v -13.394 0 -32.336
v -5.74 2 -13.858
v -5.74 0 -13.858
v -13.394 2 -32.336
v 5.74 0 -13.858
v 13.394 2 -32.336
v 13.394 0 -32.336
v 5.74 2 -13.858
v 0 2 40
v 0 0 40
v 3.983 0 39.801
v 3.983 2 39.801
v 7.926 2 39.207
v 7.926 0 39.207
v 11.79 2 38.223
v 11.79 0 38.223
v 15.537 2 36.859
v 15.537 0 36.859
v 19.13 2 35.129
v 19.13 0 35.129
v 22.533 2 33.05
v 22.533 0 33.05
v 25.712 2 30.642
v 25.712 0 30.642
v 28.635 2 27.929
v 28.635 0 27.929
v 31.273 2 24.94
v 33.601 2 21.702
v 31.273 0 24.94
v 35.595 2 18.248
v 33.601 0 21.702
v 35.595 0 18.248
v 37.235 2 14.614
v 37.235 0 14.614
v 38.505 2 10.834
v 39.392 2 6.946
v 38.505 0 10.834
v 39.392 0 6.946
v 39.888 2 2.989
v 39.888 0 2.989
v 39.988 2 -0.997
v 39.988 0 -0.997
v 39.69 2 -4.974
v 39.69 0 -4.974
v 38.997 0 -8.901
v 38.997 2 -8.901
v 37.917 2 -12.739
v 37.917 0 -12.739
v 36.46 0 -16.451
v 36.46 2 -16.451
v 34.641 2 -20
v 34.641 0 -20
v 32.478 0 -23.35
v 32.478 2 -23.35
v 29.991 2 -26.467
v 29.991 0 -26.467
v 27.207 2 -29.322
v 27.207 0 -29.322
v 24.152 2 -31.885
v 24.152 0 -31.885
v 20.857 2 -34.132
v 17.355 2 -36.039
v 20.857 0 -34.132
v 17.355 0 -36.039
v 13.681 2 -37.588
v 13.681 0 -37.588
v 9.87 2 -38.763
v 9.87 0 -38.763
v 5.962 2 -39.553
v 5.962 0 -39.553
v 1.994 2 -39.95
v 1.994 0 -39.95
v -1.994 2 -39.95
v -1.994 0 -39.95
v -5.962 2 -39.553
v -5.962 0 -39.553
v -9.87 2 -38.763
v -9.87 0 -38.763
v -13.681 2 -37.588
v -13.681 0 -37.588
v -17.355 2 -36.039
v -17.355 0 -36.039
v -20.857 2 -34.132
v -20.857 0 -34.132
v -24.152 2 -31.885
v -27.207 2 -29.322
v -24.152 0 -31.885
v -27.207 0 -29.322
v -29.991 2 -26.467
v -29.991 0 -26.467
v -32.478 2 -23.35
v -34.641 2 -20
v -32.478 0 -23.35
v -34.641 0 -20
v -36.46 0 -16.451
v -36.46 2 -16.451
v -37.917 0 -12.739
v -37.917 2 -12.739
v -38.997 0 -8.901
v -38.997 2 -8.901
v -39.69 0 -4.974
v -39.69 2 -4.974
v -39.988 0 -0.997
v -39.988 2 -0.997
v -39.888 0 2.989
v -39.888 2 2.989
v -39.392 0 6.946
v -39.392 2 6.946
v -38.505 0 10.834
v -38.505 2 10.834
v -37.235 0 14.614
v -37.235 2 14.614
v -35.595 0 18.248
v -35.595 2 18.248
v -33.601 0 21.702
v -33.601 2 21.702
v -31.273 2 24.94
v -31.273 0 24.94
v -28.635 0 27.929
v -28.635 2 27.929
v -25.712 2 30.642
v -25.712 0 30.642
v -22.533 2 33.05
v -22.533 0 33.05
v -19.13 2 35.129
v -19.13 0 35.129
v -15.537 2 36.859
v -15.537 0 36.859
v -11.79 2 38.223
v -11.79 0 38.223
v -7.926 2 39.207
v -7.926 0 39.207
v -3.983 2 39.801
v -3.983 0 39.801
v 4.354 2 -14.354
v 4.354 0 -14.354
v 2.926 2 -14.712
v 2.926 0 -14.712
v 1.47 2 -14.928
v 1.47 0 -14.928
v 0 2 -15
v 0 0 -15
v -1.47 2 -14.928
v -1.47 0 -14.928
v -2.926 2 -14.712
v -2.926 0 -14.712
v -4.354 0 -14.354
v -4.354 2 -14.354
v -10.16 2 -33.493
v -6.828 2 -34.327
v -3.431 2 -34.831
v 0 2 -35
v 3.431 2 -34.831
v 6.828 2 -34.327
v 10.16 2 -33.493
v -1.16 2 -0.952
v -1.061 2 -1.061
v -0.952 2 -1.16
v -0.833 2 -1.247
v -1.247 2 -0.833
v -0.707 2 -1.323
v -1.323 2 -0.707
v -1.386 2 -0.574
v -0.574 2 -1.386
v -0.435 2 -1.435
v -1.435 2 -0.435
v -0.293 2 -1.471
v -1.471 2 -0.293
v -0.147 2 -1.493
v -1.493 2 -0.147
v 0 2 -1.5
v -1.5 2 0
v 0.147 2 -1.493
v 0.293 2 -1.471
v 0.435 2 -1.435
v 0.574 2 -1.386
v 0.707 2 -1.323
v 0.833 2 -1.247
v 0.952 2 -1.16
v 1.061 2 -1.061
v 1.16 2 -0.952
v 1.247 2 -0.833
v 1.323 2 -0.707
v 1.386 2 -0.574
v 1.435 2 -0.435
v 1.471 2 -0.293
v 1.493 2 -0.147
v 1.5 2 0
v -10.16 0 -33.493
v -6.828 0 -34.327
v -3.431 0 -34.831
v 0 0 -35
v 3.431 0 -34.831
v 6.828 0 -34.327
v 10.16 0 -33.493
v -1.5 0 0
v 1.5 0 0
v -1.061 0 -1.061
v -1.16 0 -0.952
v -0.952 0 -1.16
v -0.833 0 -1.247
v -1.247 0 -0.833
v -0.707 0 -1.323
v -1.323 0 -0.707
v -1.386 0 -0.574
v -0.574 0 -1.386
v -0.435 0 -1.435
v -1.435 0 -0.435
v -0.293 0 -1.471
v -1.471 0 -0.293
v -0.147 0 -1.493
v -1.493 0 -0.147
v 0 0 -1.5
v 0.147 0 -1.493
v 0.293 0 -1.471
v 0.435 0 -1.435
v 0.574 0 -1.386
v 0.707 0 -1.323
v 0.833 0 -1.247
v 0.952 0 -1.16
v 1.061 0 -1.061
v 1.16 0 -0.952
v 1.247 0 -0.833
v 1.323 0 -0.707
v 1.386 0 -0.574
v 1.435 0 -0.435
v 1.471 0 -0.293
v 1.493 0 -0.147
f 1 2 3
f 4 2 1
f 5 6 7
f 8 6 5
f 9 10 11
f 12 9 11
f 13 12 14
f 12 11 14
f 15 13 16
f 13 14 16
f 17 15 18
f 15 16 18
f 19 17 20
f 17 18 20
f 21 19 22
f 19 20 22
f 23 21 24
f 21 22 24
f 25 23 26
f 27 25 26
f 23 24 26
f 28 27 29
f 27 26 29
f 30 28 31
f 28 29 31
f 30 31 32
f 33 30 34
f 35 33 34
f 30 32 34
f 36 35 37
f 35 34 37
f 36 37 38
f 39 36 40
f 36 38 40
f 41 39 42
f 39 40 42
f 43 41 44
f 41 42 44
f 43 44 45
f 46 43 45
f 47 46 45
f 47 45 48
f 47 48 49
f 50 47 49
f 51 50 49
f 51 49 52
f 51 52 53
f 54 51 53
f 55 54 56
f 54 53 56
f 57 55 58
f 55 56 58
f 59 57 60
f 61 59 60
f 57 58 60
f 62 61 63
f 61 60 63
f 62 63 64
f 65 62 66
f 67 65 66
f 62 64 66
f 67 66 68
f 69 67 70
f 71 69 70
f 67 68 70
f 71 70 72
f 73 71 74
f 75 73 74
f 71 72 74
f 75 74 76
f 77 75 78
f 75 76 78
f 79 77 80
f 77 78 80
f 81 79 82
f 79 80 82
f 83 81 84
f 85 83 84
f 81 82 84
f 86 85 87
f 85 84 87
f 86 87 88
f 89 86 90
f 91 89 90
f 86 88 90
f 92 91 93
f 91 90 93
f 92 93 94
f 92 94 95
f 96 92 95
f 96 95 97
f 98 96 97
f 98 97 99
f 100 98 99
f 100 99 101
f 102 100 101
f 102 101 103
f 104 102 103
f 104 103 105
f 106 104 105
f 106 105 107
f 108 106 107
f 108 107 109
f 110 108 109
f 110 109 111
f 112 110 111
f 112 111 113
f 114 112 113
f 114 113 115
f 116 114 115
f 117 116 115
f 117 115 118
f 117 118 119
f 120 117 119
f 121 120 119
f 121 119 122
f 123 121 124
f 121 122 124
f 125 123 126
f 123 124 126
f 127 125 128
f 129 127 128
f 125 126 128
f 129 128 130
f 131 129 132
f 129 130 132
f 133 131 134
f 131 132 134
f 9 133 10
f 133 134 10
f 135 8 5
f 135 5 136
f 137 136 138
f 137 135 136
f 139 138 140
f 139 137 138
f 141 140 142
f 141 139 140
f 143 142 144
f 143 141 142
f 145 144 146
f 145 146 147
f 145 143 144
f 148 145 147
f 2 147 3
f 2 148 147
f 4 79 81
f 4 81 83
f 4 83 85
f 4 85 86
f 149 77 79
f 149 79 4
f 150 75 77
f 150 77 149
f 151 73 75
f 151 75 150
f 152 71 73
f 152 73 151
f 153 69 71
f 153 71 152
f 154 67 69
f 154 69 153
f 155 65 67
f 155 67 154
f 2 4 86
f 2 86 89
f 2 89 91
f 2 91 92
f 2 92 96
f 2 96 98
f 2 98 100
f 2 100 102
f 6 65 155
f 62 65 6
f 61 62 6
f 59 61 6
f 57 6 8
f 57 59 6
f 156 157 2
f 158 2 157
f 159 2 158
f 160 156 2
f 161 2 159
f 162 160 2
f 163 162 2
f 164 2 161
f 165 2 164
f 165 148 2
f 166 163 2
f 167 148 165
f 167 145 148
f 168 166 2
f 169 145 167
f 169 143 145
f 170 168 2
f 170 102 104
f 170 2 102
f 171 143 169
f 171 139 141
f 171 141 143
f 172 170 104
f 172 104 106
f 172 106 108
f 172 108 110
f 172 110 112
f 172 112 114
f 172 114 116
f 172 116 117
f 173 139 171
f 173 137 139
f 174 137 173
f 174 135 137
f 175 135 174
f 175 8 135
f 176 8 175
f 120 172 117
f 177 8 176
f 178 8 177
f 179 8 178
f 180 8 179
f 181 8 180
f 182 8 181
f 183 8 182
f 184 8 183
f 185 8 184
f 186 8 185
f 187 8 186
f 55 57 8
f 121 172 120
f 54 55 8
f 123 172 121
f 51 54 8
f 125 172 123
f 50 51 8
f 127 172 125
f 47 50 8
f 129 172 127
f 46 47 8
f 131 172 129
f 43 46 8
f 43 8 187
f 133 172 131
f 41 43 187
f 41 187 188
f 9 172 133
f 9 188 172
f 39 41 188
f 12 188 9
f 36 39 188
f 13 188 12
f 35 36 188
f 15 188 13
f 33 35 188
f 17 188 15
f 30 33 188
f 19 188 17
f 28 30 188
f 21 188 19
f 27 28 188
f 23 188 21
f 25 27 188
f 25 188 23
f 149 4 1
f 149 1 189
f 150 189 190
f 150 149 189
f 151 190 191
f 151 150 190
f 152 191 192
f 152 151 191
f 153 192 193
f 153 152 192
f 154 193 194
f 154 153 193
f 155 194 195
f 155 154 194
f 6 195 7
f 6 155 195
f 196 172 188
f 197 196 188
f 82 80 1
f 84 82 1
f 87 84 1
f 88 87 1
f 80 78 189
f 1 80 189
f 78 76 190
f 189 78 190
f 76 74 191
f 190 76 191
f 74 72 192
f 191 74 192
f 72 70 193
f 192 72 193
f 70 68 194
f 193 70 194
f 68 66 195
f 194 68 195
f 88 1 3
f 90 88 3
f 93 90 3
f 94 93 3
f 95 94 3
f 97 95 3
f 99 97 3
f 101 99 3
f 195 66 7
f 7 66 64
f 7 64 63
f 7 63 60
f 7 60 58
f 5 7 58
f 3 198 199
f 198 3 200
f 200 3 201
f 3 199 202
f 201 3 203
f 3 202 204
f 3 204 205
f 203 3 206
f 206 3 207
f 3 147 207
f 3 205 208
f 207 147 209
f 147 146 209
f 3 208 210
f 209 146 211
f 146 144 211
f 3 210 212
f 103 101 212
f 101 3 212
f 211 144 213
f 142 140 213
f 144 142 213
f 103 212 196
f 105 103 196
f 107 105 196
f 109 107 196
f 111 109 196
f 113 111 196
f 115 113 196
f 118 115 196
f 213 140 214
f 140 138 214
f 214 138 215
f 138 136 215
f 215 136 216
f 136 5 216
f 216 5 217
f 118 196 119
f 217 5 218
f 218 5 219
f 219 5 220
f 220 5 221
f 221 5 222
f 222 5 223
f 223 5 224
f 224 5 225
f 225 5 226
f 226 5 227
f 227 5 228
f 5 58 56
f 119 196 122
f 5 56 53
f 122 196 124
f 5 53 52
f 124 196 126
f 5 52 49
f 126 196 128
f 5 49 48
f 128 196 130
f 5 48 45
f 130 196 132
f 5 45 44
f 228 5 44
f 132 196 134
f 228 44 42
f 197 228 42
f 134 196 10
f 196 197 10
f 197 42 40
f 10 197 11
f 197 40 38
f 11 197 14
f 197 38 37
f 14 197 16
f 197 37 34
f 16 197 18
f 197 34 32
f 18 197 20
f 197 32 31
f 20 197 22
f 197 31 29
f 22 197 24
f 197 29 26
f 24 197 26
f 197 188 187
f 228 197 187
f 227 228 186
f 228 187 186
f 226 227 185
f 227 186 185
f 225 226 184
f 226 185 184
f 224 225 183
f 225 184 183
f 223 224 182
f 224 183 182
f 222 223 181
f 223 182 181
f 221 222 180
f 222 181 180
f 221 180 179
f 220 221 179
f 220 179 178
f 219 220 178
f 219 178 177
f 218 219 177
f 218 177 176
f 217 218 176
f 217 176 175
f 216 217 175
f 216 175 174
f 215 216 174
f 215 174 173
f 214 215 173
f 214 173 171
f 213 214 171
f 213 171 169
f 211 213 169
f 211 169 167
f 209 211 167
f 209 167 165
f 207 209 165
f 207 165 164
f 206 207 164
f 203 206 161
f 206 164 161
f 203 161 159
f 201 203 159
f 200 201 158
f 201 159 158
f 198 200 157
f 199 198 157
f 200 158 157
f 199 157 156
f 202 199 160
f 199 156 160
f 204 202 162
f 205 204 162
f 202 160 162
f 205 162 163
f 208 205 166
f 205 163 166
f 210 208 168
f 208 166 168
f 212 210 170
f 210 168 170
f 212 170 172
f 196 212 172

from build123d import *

# Parameters (mm, degrees)
SKETCH2_R           = 40
BOSS_EXTRUDE1_DEPTH = 2
CUT_EXTRUDE1_REACH  = 58.604
CUT_EXTRUDE2_DEPTH  = 57.603886792


with BuildPart() as part:
    # Sketch2 → Boss-Extrude1 (new body)
    with BuildSketch(Plane(origin=(0, 0, 0), x_dir=(1, 0, 0), z_dir=(0, 1, 0))):
        with Locations(Location((0, 0, 0), (0, 0, 270))):
            Circle(SKETCH2_R)
    extrude(amount=BOSS_EXTRUDE1_DEPTH)

    # Sketch3 → Cut-Extrude1 (cut, up to next)
    with BuildSketch(Plane(origin=(0, 2, 0), x_dir=(1, 0, 0), z_dir=(0, 1, 0)), mode=Mode.PRIVATE) as cut_extrude1_sk1:
        with BuildLine():
            Line((-5.740251485, 13.858192988), (-13.393920133, 32.335783638))
            ThreePointArc((-13.393920133, 32.335783638), (0, 35), (13.393920133, 32.335783638))
            Line((13.393920133, 32.335783638), (5.740251485, 13.858192988))
            ThreePointArc((5.740251485, 13.858192988), (0, 15), (-5.740251485, 13.858192988))
        make_face()
    cut_extrude1_tool1 = extrude(cut_extrude1_sk1.sketch, amount=-CUT_EXTRUDE1_REACH, mode=Mode.PRIVATE) & part.part
    add(cut_extrude1_tool1.solids().sort_by_distance((0, 2, -25.661711))[0], mode=Mode.SUBTRACT)

    # Sketch5 → Cut-Extrude2 (cut, through all)
    with BuildSketch(Plane(origin=(0, 2, 0), x_dir=(1, 0, 0), z_dir=(0, 1, 0))):
        with BuildLine():
            Line((-1.5, 0), (1.5, 0))
            ThreePointArc((1.5, 0), (0, 1.5), (-1.5, 0))
        make_face()
    extrude(amount=-CUT_EXTRUDE2_DEPTH, mode=Mode.SUBTRACT)


solid = part.part
